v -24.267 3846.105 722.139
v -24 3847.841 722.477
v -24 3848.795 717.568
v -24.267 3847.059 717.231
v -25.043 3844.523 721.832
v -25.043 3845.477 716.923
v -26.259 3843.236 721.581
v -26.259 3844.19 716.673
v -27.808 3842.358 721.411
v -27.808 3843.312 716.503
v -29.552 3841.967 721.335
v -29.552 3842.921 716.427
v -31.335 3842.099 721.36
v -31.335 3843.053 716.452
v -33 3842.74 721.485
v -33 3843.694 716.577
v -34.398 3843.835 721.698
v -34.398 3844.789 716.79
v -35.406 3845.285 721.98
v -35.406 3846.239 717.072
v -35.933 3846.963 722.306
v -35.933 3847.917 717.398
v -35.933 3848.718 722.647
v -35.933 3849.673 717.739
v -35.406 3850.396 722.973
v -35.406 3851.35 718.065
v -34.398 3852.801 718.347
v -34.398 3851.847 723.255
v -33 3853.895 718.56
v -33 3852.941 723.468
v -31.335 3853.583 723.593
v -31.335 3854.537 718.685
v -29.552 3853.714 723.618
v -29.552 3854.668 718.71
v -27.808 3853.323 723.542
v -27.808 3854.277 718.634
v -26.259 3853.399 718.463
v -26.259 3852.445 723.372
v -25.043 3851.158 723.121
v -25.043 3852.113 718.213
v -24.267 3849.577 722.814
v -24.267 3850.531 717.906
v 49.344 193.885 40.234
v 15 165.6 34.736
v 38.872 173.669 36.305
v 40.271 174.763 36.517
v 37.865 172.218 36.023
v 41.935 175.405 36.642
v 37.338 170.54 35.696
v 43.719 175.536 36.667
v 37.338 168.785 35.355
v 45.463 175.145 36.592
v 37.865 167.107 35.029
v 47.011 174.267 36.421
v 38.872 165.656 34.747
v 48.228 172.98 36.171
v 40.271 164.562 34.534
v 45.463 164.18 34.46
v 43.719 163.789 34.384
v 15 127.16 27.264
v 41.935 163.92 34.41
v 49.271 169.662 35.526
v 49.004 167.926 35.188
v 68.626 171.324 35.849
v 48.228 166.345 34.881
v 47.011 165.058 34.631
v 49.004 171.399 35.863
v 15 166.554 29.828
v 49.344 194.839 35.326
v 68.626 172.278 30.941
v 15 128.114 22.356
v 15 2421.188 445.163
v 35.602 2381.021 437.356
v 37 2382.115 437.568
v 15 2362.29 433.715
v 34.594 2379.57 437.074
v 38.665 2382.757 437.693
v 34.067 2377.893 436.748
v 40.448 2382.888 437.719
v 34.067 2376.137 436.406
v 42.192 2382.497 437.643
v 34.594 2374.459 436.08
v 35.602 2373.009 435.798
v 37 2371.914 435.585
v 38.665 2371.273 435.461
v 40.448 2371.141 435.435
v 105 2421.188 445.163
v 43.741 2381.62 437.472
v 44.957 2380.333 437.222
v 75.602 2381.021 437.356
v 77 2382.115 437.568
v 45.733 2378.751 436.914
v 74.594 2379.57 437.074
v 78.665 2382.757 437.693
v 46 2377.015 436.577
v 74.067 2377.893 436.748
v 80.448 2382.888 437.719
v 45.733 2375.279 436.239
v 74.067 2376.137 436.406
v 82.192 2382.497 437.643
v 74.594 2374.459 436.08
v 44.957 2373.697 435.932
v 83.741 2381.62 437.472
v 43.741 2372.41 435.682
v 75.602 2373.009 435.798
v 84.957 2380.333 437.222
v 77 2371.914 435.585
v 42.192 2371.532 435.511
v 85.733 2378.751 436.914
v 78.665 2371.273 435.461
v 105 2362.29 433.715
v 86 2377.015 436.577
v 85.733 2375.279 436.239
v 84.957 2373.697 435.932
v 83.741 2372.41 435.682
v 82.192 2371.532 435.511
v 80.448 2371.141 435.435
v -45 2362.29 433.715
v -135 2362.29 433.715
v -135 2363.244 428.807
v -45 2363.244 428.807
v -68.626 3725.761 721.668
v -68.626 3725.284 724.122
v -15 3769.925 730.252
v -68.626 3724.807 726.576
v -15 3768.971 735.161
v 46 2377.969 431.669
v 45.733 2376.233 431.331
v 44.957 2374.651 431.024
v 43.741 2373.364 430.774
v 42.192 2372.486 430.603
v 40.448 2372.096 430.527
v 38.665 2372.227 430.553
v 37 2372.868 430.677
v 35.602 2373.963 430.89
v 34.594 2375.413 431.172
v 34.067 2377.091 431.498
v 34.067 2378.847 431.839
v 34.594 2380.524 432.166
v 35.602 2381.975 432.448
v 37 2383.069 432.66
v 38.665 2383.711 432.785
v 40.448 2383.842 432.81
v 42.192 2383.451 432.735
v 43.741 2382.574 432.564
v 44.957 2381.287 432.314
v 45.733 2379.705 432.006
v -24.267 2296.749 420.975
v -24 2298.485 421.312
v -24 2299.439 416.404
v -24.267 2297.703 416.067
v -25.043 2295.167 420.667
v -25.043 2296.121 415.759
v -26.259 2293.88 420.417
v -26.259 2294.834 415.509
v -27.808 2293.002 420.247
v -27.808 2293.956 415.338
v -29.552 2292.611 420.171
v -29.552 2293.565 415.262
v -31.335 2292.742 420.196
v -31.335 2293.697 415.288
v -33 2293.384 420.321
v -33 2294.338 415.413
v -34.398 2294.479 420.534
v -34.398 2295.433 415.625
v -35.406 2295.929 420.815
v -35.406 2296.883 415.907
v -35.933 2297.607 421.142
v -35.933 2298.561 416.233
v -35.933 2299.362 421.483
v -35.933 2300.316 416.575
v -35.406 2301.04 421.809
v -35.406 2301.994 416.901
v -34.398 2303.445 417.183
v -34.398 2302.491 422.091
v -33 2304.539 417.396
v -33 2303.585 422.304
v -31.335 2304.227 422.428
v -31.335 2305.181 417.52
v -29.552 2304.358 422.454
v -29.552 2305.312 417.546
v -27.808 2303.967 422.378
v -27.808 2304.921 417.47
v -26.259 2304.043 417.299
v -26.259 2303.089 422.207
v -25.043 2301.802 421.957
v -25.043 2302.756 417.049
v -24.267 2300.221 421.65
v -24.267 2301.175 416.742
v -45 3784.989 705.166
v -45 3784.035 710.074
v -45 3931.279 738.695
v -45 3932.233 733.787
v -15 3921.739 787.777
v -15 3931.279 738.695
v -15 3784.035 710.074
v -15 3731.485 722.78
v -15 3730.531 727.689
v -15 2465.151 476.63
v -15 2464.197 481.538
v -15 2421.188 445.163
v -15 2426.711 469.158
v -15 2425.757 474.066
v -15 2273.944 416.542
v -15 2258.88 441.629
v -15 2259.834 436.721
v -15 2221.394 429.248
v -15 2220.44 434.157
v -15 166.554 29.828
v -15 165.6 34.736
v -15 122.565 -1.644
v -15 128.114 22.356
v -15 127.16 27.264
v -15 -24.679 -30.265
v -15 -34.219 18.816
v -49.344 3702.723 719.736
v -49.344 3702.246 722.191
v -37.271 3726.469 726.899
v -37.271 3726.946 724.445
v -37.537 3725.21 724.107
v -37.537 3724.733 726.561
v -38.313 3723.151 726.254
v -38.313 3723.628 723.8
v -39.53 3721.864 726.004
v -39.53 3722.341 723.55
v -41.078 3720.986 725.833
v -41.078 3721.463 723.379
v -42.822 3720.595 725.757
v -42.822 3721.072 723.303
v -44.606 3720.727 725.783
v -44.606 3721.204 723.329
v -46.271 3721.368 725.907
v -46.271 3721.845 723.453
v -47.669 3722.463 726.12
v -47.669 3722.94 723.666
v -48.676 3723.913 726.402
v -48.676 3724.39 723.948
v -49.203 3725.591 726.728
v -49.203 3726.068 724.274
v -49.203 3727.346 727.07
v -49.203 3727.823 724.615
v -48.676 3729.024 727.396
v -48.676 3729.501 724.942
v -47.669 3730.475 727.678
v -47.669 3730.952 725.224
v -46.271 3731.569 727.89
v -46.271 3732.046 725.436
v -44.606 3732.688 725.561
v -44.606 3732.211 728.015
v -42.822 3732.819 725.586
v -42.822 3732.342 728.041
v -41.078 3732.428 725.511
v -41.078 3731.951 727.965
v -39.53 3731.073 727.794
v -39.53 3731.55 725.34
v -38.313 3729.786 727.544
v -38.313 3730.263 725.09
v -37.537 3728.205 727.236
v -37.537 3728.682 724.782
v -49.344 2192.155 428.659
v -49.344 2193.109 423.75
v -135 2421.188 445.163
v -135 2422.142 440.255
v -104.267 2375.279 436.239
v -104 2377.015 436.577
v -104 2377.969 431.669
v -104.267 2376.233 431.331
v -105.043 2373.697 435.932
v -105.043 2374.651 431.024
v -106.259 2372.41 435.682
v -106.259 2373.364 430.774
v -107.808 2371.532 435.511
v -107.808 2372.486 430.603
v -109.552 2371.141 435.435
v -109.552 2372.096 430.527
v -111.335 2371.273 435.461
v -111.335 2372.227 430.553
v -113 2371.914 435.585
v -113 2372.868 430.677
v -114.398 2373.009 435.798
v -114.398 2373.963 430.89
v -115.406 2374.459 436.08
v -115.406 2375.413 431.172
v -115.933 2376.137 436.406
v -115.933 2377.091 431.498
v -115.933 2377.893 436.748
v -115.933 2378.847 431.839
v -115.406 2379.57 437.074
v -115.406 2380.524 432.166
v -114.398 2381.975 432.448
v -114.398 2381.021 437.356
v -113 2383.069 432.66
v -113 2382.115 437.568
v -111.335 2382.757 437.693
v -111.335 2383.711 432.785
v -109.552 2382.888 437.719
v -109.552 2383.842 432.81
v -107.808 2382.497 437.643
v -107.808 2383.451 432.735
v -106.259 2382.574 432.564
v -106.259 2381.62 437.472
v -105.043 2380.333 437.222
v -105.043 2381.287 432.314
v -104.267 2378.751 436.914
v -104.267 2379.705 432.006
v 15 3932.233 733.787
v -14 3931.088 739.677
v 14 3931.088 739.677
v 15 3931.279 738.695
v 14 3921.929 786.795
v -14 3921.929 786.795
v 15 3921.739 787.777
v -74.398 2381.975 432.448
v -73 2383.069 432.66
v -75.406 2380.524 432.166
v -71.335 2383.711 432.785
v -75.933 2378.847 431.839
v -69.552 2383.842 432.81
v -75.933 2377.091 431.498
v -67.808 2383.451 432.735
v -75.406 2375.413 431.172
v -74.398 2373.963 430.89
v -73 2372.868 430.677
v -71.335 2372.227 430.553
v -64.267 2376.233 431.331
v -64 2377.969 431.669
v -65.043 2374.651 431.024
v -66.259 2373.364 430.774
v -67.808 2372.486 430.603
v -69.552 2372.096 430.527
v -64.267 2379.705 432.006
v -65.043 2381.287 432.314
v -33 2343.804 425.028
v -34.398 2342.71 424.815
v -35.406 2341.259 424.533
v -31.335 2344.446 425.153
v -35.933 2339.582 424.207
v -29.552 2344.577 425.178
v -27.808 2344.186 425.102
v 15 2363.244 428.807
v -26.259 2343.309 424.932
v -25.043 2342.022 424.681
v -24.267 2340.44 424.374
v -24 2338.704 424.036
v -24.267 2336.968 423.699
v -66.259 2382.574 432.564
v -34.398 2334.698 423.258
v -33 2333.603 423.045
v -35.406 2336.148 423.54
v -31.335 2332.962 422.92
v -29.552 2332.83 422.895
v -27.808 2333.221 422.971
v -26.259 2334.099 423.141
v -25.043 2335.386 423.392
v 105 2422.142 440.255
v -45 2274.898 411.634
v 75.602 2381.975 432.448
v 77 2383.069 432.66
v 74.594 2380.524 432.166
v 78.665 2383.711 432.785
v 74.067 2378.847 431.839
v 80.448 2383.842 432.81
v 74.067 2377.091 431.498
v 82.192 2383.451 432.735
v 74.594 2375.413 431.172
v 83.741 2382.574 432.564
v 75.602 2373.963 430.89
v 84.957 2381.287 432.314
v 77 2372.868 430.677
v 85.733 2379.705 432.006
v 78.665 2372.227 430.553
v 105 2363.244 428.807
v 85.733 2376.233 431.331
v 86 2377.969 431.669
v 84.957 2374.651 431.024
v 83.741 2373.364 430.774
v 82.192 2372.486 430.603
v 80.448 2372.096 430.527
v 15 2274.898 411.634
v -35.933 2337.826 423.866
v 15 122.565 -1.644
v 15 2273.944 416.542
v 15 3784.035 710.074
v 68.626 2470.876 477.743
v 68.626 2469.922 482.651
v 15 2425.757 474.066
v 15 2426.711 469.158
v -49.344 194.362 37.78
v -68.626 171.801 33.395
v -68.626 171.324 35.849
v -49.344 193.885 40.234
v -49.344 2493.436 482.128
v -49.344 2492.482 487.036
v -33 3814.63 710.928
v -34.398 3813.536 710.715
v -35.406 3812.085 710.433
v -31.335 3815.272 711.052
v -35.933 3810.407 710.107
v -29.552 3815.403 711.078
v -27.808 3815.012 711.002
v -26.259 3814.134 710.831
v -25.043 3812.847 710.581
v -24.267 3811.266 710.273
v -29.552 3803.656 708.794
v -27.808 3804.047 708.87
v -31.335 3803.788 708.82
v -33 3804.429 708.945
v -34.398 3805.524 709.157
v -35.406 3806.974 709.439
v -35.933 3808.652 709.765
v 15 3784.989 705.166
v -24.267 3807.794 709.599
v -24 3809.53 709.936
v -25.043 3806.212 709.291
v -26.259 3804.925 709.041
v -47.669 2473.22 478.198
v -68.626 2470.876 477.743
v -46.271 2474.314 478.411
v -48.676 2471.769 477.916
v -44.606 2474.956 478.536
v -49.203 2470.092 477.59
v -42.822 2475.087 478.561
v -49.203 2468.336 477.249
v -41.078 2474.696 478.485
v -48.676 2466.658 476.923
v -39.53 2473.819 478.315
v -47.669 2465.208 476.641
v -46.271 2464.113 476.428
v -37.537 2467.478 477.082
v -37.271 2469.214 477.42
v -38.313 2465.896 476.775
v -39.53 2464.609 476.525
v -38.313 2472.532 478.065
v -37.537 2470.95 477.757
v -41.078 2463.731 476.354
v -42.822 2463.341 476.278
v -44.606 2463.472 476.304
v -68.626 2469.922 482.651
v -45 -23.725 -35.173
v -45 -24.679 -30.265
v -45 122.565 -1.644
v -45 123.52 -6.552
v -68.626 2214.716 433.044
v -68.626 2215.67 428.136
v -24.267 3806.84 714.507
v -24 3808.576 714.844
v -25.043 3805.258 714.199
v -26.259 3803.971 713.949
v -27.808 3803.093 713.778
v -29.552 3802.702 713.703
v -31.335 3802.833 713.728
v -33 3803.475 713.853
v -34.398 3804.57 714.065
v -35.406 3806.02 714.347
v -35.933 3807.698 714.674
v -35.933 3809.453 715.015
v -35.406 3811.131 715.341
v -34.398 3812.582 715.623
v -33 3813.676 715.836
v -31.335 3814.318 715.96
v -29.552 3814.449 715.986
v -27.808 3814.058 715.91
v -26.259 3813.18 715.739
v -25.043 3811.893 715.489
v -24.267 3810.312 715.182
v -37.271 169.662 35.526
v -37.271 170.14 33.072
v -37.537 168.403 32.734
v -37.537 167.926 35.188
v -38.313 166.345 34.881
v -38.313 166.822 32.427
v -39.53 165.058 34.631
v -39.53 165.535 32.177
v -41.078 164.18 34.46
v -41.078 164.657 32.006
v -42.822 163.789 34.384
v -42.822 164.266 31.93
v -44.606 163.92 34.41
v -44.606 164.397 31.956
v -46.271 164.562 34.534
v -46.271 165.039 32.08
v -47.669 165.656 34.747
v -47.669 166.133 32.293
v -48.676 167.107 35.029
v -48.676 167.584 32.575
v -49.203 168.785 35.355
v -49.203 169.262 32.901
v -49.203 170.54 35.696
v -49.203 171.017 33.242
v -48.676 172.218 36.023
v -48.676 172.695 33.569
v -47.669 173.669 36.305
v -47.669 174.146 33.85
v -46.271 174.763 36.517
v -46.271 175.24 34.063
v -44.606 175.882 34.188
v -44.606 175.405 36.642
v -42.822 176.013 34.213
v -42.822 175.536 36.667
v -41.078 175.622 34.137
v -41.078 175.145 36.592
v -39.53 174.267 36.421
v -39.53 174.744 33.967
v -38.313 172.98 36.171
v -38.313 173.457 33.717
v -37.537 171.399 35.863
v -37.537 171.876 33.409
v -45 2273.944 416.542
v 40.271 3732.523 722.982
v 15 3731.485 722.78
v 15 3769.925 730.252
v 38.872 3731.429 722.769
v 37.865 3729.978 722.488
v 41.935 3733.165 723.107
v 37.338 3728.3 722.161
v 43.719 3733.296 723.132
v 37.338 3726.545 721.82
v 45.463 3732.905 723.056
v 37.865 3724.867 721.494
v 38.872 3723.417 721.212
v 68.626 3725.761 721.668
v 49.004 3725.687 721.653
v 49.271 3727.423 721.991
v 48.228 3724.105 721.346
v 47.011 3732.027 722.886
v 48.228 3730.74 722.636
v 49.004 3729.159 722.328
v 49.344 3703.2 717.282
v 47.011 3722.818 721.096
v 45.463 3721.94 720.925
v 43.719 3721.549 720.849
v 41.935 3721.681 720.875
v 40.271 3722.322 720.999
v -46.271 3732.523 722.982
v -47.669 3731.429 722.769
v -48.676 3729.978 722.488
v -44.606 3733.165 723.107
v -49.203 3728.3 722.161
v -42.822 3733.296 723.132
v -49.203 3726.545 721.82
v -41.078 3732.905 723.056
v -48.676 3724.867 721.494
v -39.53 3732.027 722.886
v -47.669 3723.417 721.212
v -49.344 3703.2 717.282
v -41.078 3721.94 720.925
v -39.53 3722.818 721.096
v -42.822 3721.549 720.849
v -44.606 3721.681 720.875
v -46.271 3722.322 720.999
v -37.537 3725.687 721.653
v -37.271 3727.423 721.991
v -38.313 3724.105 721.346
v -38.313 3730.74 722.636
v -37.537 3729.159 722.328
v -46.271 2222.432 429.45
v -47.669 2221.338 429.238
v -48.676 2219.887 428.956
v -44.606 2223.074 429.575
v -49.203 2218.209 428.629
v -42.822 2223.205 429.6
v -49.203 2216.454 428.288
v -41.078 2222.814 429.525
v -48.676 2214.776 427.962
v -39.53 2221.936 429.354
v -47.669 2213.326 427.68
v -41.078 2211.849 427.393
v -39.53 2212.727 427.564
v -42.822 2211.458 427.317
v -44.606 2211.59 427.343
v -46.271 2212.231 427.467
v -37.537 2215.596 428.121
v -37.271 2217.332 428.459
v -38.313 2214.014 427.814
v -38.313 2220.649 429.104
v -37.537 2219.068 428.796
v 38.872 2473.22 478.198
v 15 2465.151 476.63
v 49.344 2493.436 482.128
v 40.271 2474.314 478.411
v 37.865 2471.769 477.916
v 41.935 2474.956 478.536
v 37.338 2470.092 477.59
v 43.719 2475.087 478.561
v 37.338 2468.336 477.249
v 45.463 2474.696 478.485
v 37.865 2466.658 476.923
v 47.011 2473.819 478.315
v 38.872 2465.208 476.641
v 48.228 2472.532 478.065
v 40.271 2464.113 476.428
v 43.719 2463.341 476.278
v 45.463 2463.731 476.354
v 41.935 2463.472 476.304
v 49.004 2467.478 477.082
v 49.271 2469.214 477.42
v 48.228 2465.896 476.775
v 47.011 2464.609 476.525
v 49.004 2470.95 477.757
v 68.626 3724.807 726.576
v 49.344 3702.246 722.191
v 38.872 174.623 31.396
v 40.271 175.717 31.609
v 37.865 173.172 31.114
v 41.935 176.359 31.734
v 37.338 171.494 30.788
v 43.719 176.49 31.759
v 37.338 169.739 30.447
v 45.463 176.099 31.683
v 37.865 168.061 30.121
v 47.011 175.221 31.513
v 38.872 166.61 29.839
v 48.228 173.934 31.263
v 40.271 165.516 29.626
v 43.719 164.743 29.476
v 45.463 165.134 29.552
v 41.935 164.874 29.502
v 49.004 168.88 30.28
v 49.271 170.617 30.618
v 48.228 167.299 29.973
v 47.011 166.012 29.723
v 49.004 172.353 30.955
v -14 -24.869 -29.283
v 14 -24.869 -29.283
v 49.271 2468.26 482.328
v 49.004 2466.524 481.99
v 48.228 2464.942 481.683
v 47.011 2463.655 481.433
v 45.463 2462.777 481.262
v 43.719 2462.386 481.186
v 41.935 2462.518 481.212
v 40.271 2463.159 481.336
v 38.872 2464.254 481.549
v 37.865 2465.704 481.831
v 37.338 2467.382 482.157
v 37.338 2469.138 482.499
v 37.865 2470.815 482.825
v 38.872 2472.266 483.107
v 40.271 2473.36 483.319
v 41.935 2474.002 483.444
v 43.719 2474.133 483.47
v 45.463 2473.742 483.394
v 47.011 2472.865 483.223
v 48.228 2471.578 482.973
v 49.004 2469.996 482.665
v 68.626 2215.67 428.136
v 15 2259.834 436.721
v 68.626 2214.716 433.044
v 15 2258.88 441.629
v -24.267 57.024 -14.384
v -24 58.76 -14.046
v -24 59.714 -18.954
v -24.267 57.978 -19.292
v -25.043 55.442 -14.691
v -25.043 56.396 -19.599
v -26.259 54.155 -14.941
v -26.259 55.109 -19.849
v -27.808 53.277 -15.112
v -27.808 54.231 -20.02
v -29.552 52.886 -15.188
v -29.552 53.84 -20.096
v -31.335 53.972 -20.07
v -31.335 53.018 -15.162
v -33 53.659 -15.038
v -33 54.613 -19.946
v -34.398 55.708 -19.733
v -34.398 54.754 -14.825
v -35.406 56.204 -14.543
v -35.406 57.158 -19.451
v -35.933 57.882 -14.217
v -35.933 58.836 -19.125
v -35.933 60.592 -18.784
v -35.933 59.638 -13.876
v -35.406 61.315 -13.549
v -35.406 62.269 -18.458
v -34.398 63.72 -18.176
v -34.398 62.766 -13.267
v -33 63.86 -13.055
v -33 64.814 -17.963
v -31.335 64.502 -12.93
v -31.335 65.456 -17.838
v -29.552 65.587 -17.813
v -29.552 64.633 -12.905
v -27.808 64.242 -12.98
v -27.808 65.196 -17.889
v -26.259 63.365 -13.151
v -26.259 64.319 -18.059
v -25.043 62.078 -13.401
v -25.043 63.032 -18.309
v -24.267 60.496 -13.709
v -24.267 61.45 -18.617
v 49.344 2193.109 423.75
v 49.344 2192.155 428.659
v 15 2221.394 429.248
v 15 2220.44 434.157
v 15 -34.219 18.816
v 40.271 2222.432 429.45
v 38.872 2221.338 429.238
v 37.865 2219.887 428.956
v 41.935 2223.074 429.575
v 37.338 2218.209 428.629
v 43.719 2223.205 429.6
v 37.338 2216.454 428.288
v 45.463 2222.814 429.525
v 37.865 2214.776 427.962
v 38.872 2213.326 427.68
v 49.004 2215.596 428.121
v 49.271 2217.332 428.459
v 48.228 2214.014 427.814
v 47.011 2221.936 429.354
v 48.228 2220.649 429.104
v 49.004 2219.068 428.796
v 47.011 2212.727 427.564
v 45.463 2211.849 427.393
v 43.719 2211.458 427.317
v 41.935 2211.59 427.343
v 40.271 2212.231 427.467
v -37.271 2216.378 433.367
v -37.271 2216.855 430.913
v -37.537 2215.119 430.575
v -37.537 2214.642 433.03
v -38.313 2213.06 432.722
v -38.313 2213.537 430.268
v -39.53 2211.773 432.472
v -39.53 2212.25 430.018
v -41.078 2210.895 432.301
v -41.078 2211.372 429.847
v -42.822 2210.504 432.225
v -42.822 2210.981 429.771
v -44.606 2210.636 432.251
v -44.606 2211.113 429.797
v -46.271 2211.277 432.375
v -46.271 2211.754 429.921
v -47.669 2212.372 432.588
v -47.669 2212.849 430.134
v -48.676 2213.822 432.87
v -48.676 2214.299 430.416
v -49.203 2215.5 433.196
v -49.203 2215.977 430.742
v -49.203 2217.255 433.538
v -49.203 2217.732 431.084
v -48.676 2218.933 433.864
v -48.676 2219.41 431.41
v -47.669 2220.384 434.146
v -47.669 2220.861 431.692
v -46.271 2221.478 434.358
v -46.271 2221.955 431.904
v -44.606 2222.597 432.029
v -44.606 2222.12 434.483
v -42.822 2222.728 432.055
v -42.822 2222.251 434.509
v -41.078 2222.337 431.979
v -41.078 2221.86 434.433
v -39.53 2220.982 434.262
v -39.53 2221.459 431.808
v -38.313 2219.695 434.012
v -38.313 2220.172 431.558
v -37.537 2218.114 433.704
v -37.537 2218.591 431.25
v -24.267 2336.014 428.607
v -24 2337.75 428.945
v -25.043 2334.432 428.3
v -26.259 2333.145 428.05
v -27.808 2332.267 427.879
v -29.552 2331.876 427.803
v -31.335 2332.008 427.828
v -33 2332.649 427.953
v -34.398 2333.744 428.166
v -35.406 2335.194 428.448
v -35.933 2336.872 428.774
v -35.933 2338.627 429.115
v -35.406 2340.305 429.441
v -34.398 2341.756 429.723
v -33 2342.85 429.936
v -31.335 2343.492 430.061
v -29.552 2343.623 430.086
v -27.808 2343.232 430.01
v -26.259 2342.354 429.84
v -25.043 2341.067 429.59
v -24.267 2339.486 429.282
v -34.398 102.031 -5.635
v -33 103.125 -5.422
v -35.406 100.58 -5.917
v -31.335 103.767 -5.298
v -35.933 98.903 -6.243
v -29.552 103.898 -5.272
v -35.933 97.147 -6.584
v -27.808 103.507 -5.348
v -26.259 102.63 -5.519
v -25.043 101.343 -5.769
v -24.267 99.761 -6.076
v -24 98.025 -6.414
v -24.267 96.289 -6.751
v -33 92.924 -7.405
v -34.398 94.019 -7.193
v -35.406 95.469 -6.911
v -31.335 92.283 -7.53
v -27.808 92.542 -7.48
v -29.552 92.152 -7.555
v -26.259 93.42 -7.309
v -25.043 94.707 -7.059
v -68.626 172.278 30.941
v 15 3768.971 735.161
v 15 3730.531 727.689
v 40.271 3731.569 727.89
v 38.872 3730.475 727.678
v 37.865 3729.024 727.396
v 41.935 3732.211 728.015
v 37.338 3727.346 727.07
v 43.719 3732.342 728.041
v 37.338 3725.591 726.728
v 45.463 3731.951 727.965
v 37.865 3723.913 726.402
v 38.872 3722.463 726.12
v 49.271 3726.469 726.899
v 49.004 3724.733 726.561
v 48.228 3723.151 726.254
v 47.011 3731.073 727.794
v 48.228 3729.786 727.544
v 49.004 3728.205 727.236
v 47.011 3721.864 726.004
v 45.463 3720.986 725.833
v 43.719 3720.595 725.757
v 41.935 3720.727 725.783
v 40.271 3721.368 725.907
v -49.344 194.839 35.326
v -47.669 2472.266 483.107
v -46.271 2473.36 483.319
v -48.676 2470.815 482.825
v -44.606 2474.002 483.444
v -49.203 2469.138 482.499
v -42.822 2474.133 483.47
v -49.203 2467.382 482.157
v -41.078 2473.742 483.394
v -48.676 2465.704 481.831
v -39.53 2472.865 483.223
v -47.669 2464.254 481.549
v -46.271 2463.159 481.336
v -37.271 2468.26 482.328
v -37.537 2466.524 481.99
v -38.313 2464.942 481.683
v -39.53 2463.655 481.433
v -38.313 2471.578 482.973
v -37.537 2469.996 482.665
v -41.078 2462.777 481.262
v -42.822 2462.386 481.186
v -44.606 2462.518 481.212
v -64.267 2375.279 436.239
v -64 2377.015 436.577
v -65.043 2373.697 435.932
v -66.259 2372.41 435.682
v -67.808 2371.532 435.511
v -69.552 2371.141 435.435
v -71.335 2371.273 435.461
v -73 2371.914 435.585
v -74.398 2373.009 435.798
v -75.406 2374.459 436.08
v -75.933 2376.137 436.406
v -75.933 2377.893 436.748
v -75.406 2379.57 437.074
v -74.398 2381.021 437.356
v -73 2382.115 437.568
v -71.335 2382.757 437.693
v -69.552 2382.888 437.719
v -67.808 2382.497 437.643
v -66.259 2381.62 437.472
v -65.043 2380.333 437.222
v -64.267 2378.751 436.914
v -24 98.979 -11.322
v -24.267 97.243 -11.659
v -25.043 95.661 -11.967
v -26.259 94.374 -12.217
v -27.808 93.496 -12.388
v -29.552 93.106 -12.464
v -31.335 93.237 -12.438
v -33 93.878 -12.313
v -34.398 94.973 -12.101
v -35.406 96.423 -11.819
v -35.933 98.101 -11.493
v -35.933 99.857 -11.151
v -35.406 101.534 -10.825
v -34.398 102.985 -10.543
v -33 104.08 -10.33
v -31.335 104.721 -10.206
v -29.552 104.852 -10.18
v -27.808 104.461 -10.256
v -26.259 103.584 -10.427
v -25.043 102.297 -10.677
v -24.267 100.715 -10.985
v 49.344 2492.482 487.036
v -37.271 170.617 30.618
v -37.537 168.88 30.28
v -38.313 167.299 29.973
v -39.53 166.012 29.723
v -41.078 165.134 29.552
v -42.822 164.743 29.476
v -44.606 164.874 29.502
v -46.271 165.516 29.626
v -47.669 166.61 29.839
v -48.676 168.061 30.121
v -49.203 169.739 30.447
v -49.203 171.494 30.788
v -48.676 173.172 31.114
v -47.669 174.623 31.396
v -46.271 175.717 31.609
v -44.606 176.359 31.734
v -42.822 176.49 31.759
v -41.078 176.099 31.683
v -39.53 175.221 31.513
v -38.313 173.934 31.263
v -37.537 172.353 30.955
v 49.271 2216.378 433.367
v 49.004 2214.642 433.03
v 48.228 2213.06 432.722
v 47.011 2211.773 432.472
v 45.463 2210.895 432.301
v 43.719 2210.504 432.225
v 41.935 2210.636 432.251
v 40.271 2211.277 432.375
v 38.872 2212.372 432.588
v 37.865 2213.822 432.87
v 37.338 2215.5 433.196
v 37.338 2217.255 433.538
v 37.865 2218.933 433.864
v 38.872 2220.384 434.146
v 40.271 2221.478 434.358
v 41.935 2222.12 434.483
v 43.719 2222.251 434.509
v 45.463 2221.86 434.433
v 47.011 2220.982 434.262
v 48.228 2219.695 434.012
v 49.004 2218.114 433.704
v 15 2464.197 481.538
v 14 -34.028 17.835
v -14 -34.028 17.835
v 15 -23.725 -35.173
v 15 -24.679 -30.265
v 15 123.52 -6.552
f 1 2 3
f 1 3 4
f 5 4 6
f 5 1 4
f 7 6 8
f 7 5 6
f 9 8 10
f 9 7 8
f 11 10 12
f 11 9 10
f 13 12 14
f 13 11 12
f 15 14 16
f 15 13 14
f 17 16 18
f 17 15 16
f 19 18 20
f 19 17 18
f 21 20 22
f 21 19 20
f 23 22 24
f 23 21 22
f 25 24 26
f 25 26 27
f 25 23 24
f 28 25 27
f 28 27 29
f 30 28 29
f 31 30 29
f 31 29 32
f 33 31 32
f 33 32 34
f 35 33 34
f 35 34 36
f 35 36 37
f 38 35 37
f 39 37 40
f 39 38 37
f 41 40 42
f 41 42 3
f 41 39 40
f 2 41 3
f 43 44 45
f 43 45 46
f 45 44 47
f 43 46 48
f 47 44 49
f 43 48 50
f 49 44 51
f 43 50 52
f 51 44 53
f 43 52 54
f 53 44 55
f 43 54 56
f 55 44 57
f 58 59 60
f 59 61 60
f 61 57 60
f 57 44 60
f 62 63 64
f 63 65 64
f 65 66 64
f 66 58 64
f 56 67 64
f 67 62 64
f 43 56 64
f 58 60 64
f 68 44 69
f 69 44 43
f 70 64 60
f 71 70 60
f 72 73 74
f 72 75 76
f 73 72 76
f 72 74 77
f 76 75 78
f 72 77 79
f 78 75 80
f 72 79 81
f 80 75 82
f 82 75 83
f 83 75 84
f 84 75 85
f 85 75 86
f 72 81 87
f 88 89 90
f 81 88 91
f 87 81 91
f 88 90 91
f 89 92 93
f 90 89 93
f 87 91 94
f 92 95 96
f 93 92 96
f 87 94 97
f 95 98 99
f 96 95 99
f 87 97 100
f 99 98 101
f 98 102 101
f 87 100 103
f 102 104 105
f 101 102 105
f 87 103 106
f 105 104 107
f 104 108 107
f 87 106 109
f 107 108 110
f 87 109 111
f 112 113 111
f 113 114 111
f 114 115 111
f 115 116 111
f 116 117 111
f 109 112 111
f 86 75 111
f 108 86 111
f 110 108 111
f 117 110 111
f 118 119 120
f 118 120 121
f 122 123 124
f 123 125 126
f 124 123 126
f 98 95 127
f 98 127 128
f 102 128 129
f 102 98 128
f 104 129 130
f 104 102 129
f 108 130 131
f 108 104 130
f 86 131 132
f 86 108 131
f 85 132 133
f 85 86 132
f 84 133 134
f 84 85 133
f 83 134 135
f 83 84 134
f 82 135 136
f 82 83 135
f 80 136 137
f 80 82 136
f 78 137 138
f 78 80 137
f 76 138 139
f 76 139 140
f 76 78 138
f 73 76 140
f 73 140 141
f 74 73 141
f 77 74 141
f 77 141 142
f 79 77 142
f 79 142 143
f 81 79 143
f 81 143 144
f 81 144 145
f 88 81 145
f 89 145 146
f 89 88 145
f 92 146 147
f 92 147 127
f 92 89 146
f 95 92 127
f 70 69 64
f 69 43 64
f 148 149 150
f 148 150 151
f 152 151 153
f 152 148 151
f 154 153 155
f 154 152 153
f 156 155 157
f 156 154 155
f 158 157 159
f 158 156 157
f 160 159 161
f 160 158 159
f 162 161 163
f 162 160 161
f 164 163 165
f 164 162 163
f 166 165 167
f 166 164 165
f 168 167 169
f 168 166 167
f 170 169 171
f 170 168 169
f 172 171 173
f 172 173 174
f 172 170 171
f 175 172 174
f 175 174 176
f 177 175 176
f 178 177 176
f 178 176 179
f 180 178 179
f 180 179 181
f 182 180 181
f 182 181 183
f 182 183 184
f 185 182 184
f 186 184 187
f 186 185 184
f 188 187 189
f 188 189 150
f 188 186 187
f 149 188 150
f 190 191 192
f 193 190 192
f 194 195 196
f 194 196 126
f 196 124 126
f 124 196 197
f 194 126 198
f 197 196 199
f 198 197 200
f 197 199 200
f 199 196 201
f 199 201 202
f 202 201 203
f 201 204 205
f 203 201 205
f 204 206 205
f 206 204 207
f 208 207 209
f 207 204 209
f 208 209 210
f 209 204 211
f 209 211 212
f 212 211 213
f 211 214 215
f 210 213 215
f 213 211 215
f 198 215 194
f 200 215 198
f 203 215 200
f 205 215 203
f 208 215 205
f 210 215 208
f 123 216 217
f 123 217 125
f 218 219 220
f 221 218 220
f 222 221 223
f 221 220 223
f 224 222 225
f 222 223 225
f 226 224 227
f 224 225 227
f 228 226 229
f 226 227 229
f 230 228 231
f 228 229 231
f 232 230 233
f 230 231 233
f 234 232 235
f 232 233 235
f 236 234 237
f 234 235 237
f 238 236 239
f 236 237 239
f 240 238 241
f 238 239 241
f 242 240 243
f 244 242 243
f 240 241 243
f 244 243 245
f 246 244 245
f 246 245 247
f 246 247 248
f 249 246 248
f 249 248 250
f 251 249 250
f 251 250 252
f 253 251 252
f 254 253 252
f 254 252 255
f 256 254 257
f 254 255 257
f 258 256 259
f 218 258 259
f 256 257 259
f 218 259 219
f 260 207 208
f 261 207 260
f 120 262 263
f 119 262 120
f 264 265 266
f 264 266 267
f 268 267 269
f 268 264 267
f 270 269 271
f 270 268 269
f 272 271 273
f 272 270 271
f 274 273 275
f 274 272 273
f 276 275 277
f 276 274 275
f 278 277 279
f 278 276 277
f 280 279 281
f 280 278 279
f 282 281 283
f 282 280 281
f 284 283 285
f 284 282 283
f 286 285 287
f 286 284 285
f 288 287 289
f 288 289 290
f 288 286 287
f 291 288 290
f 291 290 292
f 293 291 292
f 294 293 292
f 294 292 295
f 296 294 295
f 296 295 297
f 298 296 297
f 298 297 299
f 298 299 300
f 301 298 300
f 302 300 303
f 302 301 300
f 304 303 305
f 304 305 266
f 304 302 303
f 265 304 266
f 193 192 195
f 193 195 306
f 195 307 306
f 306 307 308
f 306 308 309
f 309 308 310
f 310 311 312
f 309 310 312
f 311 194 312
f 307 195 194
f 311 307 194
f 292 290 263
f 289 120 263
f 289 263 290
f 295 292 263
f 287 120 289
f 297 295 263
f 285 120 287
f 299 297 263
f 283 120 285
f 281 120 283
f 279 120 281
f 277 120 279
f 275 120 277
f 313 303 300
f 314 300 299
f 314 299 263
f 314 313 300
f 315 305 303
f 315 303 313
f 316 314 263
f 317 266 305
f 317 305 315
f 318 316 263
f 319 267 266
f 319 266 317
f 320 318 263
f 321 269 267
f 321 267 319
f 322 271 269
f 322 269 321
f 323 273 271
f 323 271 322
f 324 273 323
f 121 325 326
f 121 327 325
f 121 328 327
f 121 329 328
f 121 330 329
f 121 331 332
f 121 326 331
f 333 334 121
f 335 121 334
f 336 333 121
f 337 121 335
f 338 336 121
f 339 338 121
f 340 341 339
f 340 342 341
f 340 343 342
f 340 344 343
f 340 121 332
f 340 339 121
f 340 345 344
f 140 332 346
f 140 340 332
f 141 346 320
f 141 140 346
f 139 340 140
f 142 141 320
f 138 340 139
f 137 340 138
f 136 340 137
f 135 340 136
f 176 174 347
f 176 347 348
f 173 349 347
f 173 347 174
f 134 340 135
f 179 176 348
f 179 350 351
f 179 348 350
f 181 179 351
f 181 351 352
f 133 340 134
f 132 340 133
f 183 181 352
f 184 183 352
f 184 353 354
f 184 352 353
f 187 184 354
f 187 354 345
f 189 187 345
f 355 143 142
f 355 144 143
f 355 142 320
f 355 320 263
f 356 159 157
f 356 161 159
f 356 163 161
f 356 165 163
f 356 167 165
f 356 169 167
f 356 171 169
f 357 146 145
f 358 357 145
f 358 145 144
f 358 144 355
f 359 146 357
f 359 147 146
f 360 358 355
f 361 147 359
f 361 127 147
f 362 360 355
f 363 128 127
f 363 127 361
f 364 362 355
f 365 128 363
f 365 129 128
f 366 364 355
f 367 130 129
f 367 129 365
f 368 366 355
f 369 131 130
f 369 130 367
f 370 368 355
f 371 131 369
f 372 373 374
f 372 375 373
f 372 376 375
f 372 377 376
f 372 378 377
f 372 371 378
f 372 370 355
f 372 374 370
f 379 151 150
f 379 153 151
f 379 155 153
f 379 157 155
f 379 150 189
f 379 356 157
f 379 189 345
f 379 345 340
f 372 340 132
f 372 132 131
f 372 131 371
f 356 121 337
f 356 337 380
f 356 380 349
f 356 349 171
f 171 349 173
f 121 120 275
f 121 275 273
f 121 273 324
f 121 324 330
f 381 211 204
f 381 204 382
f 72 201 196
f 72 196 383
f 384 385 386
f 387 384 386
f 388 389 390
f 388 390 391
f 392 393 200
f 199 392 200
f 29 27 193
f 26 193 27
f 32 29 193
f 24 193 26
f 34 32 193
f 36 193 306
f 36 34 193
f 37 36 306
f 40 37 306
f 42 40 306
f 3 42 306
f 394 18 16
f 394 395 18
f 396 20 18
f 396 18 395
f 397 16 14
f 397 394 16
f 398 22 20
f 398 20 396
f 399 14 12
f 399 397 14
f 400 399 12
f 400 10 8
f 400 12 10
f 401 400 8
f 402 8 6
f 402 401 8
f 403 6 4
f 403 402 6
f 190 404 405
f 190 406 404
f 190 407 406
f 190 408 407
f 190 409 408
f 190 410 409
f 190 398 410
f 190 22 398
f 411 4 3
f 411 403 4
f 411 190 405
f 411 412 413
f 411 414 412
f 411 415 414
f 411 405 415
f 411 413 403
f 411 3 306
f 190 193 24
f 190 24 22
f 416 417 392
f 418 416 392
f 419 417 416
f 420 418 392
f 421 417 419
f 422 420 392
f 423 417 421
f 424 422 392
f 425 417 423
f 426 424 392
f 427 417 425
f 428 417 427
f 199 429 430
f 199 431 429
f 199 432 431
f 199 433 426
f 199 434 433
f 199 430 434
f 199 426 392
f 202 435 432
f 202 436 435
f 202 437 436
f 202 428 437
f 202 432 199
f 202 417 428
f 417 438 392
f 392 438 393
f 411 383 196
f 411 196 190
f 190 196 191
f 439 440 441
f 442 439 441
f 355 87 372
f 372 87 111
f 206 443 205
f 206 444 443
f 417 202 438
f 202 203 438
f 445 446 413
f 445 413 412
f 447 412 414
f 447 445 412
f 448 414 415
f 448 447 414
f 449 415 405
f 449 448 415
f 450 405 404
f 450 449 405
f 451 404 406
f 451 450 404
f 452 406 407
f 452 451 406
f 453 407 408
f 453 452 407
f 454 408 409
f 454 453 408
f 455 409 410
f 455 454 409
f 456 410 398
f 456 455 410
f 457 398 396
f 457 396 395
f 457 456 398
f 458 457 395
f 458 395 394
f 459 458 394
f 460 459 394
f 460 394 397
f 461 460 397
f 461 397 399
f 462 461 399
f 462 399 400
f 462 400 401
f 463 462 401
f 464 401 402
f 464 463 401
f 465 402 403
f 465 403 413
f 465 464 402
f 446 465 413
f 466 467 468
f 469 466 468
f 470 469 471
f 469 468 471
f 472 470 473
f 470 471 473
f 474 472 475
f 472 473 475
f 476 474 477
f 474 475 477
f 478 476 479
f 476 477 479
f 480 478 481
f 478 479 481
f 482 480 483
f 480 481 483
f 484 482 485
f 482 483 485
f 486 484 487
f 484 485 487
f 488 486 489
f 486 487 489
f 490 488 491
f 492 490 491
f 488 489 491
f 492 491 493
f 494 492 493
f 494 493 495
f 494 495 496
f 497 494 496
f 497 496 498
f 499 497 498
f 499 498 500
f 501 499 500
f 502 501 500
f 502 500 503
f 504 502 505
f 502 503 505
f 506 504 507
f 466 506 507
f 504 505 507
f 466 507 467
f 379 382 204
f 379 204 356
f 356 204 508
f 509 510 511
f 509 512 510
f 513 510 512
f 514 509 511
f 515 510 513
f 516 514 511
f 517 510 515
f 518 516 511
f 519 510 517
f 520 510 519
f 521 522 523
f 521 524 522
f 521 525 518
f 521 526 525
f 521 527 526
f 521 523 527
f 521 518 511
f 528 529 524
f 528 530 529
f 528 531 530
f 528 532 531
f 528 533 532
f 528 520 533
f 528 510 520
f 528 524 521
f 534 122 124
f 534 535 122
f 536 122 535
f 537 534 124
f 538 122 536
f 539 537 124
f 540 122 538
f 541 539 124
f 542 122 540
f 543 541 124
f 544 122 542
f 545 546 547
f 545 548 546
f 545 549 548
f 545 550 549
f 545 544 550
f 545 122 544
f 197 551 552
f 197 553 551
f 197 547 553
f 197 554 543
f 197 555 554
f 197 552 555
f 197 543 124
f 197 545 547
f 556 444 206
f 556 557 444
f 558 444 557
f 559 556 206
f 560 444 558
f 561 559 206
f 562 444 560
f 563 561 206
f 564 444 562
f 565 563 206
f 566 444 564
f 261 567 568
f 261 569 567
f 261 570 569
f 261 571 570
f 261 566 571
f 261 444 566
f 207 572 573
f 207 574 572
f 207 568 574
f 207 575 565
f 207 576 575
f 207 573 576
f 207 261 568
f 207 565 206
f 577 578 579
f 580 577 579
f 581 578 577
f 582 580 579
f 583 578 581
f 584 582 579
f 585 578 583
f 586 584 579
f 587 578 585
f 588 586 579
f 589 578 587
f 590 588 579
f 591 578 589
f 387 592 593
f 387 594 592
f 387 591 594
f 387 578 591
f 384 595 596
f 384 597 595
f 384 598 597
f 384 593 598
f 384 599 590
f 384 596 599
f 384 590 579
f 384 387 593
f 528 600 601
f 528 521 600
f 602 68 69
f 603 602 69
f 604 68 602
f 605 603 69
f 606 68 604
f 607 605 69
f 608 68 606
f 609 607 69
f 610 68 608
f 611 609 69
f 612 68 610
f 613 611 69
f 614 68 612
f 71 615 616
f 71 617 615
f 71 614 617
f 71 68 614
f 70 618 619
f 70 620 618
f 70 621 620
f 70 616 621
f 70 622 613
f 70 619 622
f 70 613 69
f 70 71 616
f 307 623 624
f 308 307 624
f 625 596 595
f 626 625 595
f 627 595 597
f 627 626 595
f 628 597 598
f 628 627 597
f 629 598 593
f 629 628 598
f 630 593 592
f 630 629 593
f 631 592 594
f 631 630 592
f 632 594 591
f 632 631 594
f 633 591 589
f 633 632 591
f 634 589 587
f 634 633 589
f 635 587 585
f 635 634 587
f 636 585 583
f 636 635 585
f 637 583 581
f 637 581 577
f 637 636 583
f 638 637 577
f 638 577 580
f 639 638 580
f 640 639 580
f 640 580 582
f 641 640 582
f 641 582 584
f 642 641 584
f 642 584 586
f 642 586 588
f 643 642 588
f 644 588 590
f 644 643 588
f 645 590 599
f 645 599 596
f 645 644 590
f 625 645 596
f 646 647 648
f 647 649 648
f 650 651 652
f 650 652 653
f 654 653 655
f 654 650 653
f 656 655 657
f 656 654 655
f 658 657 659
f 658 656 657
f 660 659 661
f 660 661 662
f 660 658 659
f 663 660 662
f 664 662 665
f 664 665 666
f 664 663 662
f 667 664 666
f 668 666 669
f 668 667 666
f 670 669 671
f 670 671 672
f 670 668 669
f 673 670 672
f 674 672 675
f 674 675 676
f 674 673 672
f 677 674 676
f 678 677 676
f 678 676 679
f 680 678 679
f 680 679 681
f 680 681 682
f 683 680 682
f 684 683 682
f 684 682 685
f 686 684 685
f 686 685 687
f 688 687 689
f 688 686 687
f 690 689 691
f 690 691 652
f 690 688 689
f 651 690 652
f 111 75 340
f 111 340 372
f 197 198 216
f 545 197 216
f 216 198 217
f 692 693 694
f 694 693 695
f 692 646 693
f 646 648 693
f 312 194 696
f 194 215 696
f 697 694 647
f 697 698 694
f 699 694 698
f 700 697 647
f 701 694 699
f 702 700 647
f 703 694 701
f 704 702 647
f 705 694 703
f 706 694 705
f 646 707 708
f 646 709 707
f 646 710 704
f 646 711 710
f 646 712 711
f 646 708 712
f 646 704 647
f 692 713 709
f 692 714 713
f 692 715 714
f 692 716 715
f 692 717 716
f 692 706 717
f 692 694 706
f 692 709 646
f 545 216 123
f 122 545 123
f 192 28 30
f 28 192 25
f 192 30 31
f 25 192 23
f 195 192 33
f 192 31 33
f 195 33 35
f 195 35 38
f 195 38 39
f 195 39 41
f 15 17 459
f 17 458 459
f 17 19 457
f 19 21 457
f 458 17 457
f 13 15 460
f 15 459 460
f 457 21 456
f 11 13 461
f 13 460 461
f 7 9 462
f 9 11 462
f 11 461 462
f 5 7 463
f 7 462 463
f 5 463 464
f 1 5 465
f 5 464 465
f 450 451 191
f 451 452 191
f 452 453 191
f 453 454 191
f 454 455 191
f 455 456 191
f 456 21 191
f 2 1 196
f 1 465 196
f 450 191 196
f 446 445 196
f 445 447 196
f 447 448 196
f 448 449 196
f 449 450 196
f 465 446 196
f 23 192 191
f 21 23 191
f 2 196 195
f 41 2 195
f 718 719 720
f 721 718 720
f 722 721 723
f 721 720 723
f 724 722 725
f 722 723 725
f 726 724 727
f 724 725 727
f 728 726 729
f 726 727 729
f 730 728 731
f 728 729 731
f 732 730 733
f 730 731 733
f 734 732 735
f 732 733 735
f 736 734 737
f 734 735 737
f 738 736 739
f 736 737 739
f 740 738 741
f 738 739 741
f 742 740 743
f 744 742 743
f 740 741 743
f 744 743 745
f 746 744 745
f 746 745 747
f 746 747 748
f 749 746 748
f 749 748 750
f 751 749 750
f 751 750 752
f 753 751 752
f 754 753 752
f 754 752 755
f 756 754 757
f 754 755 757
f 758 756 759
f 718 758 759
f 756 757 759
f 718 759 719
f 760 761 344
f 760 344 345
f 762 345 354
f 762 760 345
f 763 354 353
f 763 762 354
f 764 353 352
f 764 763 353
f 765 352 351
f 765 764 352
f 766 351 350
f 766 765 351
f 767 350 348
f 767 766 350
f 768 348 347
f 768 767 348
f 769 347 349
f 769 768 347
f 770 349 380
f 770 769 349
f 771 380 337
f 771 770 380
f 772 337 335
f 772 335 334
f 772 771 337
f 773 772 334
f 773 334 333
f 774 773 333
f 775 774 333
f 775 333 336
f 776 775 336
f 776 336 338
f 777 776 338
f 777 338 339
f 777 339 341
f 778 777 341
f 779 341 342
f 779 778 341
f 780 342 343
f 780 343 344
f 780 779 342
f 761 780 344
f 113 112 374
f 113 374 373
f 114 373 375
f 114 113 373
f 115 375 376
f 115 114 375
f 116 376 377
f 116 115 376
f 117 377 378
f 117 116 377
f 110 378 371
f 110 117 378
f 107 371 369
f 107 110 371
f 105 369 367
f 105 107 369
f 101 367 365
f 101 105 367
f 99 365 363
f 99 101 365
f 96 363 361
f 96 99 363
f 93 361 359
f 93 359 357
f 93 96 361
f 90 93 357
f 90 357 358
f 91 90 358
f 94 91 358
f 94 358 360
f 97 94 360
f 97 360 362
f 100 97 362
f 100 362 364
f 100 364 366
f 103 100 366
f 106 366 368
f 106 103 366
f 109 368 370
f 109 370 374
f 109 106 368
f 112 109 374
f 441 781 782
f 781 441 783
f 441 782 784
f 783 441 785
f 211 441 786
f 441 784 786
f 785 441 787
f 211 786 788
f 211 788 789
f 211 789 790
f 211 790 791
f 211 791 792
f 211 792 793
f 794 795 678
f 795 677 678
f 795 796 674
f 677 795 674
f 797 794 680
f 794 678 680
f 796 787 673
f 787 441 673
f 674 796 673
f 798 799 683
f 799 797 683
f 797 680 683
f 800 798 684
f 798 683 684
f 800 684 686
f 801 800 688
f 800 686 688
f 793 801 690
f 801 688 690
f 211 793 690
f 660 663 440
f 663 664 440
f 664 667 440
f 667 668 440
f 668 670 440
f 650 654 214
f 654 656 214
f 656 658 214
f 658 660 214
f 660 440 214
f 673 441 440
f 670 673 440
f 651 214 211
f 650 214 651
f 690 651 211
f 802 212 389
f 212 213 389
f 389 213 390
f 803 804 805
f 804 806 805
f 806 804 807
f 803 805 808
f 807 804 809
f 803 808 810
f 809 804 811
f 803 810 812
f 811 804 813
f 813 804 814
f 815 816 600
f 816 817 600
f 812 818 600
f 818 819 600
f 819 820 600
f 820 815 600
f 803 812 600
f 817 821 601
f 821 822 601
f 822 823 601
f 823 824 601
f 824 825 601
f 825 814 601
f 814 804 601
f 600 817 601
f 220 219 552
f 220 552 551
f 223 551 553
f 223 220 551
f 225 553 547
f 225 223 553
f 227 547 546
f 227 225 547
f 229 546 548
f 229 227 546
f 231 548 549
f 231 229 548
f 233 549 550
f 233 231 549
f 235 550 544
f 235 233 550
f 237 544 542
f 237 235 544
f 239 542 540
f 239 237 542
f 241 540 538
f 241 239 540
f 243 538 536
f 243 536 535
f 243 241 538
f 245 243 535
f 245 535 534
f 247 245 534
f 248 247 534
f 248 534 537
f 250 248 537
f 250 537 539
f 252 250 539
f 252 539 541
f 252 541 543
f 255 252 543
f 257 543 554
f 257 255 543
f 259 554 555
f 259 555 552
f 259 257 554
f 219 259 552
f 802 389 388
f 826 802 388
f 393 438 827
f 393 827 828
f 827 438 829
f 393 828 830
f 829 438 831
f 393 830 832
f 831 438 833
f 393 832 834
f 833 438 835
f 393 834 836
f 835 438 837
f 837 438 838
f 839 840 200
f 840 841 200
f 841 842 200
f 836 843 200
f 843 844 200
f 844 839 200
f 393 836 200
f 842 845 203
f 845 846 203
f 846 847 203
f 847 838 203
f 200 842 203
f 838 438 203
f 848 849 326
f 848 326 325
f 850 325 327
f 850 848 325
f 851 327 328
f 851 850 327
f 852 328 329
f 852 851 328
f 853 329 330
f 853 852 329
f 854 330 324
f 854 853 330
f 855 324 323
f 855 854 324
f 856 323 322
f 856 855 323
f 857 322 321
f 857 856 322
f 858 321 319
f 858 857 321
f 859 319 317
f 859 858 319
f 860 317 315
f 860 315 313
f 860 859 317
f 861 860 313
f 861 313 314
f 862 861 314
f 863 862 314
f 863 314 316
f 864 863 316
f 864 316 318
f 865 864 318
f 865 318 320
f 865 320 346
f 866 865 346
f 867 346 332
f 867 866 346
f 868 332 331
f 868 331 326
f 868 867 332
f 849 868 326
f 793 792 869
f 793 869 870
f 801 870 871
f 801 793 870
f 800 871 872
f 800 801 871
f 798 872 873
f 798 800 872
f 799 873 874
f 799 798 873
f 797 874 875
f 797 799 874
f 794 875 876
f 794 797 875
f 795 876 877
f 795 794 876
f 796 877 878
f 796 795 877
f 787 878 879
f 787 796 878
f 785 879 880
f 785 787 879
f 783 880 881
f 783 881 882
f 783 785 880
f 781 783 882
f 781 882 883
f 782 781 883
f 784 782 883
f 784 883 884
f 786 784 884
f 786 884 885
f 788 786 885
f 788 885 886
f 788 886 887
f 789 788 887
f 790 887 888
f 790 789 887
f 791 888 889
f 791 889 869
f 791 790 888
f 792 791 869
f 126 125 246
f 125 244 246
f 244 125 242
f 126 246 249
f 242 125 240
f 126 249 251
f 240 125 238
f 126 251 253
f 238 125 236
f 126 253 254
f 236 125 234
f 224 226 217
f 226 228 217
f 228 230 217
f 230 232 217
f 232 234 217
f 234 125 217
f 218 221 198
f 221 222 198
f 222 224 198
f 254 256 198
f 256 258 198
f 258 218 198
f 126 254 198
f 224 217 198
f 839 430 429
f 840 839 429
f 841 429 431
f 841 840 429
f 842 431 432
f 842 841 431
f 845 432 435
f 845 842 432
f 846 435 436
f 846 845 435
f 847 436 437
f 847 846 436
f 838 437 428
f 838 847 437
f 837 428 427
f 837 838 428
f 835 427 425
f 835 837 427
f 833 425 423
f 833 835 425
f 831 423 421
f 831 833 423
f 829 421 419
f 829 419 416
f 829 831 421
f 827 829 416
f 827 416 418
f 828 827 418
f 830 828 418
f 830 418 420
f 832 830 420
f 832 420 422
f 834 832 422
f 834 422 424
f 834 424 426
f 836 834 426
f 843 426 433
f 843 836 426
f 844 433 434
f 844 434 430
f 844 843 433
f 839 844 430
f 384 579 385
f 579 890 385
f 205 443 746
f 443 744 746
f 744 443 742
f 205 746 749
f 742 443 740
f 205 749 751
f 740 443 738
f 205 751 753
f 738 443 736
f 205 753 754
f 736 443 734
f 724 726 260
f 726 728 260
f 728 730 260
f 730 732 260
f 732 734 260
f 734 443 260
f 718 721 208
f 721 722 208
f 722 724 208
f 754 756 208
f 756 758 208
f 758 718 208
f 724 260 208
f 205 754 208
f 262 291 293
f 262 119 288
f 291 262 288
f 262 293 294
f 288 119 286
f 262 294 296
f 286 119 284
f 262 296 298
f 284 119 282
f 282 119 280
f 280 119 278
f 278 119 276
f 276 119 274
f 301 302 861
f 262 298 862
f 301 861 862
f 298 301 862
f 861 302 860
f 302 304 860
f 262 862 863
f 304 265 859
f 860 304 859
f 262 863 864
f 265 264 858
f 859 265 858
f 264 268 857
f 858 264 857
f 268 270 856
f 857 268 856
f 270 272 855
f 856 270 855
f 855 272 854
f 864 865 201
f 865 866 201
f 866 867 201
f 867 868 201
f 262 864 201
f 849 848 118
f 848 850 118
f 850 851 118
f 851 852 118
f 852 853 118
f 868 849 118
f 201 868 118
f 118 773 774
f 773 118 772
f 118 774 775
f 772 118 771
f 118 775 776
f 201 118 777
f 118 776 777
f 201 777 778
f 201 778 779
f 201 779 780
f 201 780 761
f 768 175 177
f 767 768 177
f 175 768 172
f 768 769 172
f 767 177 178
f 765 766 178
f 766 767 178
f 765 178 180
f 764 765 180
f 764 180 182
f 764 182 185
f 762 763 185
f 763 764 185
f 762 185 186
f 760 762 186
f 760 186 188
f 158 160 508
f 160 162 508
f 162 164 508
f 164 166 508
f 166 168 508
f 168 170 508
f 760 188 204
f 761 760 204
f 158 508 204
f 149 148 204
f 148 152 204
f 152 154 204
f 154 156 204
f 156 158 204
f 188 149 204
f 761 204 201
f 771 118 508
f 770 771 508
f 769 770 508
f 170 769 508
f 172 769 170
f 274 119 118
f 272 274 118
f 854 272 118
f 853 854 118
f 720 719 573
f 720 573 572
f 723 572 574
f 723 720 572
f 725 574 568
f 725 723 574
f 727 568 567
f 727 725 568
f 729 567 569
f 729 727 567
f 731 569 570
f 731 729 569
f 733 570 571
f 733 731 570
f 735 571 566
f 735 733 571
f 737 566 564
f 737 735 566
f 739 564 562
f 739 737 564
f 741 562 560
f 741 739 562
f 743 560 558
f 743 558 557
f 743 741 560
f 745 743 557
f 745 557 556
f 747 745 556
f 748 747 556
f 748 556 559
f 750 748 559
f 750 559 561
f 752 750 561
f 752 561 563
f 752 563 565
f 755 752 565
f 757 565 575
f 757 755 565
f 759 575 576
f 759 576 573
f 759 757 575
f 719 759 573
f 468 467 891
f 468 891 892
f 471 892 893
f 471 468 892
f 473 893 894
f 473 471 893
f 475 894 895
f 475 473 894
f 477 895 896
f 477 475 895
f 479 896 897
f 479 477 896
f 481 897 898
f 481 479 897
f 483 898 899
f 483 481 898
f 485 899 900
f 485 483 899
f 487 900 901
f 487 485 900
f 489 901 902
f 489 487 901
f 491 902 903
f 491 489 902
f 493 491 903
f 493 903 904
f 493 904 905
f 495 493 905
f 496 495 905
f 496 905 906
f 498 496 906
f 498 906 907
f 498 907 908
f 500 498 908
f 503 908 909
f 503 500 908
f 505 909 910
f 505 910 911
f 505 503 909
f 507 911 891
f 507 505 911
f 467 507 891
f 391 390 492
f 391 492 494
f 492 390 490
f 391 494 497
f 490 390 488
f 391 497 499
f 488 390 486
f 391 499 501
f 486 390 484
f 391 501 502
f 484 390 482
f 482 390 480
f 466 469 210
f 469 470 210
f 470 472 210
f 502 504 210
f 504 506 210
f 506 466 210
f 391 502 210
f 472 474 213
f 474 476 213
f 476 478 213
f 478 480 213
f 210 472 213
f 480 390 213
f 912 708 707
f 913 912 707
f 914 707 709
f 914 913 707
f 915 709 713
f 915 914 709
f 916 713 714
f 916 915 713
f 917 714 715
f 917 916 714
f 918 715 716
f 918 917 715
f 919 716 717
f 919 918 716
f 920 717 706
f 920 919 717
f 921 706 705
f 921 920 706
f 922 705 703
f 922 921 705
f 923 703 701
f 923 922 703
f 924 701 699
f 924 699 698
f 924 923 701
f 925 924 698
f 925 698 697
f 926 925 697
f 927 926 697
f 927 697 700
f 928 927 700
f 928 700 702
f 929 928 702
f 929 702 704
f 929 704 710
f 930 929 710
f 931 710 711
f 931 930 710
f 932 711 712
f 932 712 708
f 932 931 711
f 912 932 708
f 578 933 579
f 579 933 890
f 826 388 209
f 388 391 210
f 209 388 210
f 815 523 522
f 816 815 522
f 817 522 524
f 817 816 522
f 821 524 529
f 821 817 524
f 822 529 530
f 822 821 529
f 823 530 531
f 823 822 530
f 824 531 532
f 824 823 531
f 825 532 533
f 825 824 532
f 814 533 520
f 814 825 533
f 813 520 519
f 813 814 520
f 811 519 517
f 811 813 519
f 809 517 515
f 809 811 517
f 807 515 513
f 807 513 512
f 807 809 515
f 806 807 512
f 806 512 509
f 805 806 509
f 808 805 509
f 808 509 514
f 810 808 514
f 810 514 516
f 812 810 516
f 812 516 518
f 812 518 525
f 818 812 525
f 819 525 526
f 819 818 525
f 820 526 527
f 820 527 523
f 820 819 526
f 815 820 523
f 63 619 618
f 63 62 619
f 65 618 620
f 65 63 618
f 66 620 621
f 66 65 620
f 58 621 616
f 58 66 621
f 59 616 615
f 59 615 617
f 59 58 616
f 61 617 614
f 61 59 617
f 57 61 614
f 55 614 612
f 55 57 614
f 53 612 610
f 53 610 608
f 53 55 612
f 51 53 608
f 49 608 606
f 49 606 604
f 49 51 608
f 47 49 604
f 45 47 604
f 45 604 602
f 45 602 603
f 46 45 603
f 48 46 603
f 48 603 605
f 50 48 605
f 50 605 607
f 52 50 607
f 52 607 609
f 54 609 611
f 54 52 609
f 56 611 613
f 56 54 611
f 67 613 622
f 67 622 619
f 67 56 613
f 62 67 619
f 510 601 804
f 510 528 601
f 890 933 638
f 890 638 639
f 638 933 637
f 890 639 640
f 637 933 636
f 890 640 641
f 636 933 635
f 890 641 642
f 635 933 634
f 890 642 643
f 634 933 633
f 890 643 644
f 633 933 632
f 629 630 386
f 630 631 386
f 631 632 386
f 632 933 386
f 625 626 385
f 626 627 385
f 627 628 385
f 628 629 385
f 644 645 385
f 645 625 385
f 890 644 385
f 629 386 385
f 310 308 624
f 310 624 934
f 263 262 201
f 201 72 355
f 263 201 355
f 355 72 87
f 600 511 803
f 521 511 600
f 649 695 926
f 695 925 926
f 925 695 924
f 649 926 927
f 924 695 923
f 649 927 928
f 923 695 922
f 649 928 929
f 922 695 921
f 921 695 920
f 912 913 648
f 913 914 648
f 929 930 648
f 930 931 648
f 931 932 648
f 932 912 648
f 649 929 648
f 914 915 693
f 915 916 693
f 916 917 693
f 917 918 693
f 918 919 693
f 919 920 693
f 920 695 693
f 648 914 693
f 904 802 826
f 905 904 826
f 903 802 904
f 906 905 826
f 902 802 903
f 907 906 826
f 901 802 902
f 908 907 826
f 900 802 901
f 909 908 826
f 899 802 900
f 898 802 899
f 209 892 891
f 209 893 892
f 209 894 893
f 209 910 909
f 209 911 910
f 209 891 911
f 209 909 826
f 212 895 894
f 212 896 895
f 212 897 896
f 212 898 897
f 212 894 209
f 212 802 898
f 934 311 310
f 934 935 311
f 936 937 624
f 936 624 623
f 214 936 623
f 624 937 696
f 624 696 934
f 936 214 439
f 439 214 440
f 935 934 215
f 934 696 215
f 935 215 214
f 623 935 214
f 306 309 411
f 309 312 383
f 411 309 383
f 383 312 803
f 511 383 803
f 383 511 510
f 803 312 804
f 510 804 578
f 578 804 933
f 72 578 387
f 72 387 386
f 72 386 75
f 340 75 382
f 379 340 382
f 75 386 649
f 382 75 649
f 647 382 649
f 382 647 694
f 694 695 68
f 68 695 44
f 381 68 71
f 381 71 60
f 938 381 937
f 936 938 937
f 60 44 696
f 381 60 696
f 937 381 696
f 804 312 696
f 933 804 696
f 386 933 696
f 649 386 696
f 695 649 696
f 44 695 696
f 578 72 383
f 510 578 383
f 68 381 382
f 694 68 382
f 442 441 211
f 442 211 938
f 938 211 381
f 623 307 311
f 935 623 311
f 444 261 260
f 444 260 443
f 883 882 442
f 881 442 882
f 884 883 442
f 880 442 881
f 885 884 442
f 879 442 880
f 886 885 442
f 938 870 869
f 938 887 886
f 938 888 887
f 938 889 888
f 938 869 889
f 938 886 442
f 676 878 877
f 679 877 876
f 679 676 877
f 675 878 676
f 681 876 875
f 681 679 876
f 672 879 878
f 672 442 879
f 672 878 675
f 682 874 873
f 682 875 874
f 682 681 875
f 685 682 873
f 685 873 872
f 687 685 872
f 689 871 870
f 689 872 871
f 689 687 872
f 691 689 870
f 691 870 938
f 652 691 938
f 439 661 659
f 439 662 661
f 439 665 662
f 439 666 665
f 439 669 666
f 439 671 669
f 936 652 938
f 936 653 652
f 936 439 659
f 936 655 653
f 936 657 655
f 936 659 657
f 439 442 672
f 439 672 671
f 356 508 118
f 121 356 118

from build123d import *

# Parameters (mm, degrees)
F3_W           = 30
F3_H           = 50
F3_W_2         = 28
F3_H_2         = 48
F4_DEPTH       = 30
F4_DEPTH_BACK  = 4000
F5_R           = 6
F5_W           = 30
F5_H           = 150
F6_DEPTH       = 5
F7_W           = 90
F7_H           = 60
F7_R           = 6
F8_DEPTH       = 5
F9_R           = 6
F10_DEPTH      = 2.5
F10_DEPTH_BACK = 2.5
F11_R          = 6
F12_DEPTH      = 5


with BuildPart() as f4:
    # F3 (on face) → F4 (new body, two sides)
    with BuildSketch(Plane(origin=(0, 0, 0), x_dir=(1, 0, 0), z_dir=(0, -0.9816271834, -0.1908089954))) as f4_sk:
        Rectangle(F3_W, F3_H)
        Rectangle(F3_W_2, F3_H_2, mode=Mode.SUBTRACT)
    extrude(amount=F4_DEPTH)
    extrude(f4_sk.sketch, amount=-F4_DEPTH_BACK)

    # F5 (on face) → F6 (join)
    with BuildSketch(Plane(origin=(0, 4.7702248844, -24.5406795862), x_dir=(1, 0, 0), z_dir=(0, 0.1908089954, -0.9816271834))):
        Polygon((-45, -4000), (-15, -4000), (-15, -3850), (-45, -3850), (-45, -3940), align=None)
        with Locations((-30, -3915)):
            Circle(F5_R, mode=Mode.SUBTRACT)
        with Locations((-30, -3875)):
            Circle(F5_R, mode=Mode.SUBTRACT)
        with Locations((0, -3925)):
            Rectangle(F5_W, F5_H)
    extrude(amount=F6_DEPTH)

    # F7 (on face) → F8 (join)
    with BuildSketch(Plane(origin=(0, 4.7702248844, -24.5406795862), x_dir=(1, 0, 0), z_dir=(0, 0.1908089954, -0.9816271834))):
        with Locations((-90, -2431.6451083533)):
            Rectangle(F7_W, F7_H)
        with Locations((-110, -2416.6451083533)):
            Circle(F7_R, mode=Mode.SUBTRACT)
        with Locations((-70, -2416.6451083533)):
            Circle(F7_R, mode=Mode.SUBTRACT)
        Polygon((-45, -2461.6451083533), (-15, -2461.6451083533), (-15, -2311.6451083533), (-45, -2311.6451083533), (-45, -2401.6451083533), align=None)
        with Locations((-30, -2376.6451083533)):
            Circle(F7_R, mode=Mode.SUBTRACT)
        with Locations((-30, -2336.6451083533)):
            Circle(F7_R, mode=Mode.SUBTRACT)
        Polygon((-15, -2311.6451083533), (-15, -2461.6451083533), (15, -2461.6451083533), (15, -2401.6451083533), (15, -2311.6451083533), align=None)
        with Locations((60, -2431.6451083533)):
            Rectangle(F7_W, F7_H)
        with Locations((40, -2416.6451083533)):
            Circle(F7_R, mode=Mode.SUBTRACT)
        with Locations((80, -2416.6451083533)):
            Circle(F7_R, mode=Mode.SUBTRACT)
    extrude(amount=F8_DEPTH)

    # F9 (on line) → F10 (join, two sides)
    with BuildSketch(Plane(origin=(0, 0, 0), x_dir=(1, 0, 0), z_dir=(0, 0.1908089954, -0.9816271834))) as f10_sk:
        Polygon((15, -3800.8401286151), (15, -3840), (68.6263252593, -3795.0086981831), (49.3443387664, -3772.0259873577), align=None)
        with Locations((43.2705051734, -3796.7017352104)):
            Circle(F9_R, mode=Mode.SUBTRACT)
        Polygon((14.8702725282, -2510.6961412562), (15, -2510.8049797382), (15, -2471.6451083533), align=None)
        Polygon((15, -2471.6451083533), (15, -2510.8049797382), (49.3443387664, -2539.6191209957), (68.6263252593, -2516.6364101702), align=None)
        with Locations((43.2705051734, -2514.943373143)):
            Circle(F9_R, mode=Mode.SUBTRACT)
        Polygon((14.8702725282, -3800.9489670971), (15, -3840), (15, -3800.8401286151), align=None)
        Polygon((49.3443387664, -2233.671095711), (15, -2262.4852369684), (15, -2301.6451083533), (68.6263252593, -2256.6538065364), align=None)
        with Locations((43.2705051734, -2258.3468435637)):
            Circle(F9_R, mode=Mode.SUBTRACT)
        Polygon((15, -2301.6451083533), (15, -2262.4852369684), (14.8702725282, -2262.5940754504), align=None)
        Polygon((15, -169.185568556), (15, -130.0256971711), (14.8702725282, -169.0767300739), align=None)
        Polygon((68.6263252593, -175.016998988), (15, -130.0256971711), (15, -169.185568556), (49.3443387664, -197.9997098134), align=None)
        with Locations((43.2705051734, -173.3239619607)):
            Circle(F9_R, mode=Mode.SUBTRACT)
        Polygon((-68.6263252593, -175.016998988), (-49.3443387664, -197.9997098134), (-15, -169.185568556), (-15, -130.0256971711), align=None)
        with Locations((-43.2705051734, -173.3239619607)):
            Circle(F9_R, mode=Mode.SUBTRACT)
        Polygon((-15, -2301.6451083533), (-15, -2262.4852369684), (-49.3443387664, -2233.671095711), (-68.6263252593, -2256.6538065364), align=None)
        with Locations((-43.2705051734, -2258.3468435637)):
            Circle(F9_R, mode=Mode.SUBTRACT)
        Polygon((-14.8702725282, -2510.6961412562), (-15, -2471.6451083533), (-68.6263252593, -2516.6364101702), (-49.3443387664, -2539.6191209957), align=None)
        with Locations((-43.2705051734, -2514.943373143)):
            Circle(F9_R, mode=Mode.SUBTRACT)
        Polygon((-68.6263252593, -3795.0086981831), (-15, -3840), (-14.8702725282, -3800.9489670971), (-49.3443387664, -3772.0259873577), align=None)
        with Locations((-43.2705051734, -3796.7017352104)):
            Circle(F9_R, mode=Mode.SUBTRACT)
    extrude(amount=F10_DEPTH)
    extrude(f10_sk.sketch, amount=-F10_DEPTH_BACK)

    # F11 (on face) → F12 (join)
    with BuildSketch(Plane(origin=(0, 4.7702248844, -24.5406795862), x_dir=(1, 0, 0), z_dir=(0, 0.1908089954, -0.9816271834))):
        Polygon((-45, -120), (-15, -120), (15, -120), (15, 30), (-45, 30), (-45, -30), align=None)
        with Locations((-30, -95)):
            Circle(F11_R, mode=Mode.SUBTRACT)
        with Locations((-30, -55)):
            Circle(F11_R, mode=Mode.SUBTRACT)
    extrude(amount=F12_DEPTH)


solid = f4.part
